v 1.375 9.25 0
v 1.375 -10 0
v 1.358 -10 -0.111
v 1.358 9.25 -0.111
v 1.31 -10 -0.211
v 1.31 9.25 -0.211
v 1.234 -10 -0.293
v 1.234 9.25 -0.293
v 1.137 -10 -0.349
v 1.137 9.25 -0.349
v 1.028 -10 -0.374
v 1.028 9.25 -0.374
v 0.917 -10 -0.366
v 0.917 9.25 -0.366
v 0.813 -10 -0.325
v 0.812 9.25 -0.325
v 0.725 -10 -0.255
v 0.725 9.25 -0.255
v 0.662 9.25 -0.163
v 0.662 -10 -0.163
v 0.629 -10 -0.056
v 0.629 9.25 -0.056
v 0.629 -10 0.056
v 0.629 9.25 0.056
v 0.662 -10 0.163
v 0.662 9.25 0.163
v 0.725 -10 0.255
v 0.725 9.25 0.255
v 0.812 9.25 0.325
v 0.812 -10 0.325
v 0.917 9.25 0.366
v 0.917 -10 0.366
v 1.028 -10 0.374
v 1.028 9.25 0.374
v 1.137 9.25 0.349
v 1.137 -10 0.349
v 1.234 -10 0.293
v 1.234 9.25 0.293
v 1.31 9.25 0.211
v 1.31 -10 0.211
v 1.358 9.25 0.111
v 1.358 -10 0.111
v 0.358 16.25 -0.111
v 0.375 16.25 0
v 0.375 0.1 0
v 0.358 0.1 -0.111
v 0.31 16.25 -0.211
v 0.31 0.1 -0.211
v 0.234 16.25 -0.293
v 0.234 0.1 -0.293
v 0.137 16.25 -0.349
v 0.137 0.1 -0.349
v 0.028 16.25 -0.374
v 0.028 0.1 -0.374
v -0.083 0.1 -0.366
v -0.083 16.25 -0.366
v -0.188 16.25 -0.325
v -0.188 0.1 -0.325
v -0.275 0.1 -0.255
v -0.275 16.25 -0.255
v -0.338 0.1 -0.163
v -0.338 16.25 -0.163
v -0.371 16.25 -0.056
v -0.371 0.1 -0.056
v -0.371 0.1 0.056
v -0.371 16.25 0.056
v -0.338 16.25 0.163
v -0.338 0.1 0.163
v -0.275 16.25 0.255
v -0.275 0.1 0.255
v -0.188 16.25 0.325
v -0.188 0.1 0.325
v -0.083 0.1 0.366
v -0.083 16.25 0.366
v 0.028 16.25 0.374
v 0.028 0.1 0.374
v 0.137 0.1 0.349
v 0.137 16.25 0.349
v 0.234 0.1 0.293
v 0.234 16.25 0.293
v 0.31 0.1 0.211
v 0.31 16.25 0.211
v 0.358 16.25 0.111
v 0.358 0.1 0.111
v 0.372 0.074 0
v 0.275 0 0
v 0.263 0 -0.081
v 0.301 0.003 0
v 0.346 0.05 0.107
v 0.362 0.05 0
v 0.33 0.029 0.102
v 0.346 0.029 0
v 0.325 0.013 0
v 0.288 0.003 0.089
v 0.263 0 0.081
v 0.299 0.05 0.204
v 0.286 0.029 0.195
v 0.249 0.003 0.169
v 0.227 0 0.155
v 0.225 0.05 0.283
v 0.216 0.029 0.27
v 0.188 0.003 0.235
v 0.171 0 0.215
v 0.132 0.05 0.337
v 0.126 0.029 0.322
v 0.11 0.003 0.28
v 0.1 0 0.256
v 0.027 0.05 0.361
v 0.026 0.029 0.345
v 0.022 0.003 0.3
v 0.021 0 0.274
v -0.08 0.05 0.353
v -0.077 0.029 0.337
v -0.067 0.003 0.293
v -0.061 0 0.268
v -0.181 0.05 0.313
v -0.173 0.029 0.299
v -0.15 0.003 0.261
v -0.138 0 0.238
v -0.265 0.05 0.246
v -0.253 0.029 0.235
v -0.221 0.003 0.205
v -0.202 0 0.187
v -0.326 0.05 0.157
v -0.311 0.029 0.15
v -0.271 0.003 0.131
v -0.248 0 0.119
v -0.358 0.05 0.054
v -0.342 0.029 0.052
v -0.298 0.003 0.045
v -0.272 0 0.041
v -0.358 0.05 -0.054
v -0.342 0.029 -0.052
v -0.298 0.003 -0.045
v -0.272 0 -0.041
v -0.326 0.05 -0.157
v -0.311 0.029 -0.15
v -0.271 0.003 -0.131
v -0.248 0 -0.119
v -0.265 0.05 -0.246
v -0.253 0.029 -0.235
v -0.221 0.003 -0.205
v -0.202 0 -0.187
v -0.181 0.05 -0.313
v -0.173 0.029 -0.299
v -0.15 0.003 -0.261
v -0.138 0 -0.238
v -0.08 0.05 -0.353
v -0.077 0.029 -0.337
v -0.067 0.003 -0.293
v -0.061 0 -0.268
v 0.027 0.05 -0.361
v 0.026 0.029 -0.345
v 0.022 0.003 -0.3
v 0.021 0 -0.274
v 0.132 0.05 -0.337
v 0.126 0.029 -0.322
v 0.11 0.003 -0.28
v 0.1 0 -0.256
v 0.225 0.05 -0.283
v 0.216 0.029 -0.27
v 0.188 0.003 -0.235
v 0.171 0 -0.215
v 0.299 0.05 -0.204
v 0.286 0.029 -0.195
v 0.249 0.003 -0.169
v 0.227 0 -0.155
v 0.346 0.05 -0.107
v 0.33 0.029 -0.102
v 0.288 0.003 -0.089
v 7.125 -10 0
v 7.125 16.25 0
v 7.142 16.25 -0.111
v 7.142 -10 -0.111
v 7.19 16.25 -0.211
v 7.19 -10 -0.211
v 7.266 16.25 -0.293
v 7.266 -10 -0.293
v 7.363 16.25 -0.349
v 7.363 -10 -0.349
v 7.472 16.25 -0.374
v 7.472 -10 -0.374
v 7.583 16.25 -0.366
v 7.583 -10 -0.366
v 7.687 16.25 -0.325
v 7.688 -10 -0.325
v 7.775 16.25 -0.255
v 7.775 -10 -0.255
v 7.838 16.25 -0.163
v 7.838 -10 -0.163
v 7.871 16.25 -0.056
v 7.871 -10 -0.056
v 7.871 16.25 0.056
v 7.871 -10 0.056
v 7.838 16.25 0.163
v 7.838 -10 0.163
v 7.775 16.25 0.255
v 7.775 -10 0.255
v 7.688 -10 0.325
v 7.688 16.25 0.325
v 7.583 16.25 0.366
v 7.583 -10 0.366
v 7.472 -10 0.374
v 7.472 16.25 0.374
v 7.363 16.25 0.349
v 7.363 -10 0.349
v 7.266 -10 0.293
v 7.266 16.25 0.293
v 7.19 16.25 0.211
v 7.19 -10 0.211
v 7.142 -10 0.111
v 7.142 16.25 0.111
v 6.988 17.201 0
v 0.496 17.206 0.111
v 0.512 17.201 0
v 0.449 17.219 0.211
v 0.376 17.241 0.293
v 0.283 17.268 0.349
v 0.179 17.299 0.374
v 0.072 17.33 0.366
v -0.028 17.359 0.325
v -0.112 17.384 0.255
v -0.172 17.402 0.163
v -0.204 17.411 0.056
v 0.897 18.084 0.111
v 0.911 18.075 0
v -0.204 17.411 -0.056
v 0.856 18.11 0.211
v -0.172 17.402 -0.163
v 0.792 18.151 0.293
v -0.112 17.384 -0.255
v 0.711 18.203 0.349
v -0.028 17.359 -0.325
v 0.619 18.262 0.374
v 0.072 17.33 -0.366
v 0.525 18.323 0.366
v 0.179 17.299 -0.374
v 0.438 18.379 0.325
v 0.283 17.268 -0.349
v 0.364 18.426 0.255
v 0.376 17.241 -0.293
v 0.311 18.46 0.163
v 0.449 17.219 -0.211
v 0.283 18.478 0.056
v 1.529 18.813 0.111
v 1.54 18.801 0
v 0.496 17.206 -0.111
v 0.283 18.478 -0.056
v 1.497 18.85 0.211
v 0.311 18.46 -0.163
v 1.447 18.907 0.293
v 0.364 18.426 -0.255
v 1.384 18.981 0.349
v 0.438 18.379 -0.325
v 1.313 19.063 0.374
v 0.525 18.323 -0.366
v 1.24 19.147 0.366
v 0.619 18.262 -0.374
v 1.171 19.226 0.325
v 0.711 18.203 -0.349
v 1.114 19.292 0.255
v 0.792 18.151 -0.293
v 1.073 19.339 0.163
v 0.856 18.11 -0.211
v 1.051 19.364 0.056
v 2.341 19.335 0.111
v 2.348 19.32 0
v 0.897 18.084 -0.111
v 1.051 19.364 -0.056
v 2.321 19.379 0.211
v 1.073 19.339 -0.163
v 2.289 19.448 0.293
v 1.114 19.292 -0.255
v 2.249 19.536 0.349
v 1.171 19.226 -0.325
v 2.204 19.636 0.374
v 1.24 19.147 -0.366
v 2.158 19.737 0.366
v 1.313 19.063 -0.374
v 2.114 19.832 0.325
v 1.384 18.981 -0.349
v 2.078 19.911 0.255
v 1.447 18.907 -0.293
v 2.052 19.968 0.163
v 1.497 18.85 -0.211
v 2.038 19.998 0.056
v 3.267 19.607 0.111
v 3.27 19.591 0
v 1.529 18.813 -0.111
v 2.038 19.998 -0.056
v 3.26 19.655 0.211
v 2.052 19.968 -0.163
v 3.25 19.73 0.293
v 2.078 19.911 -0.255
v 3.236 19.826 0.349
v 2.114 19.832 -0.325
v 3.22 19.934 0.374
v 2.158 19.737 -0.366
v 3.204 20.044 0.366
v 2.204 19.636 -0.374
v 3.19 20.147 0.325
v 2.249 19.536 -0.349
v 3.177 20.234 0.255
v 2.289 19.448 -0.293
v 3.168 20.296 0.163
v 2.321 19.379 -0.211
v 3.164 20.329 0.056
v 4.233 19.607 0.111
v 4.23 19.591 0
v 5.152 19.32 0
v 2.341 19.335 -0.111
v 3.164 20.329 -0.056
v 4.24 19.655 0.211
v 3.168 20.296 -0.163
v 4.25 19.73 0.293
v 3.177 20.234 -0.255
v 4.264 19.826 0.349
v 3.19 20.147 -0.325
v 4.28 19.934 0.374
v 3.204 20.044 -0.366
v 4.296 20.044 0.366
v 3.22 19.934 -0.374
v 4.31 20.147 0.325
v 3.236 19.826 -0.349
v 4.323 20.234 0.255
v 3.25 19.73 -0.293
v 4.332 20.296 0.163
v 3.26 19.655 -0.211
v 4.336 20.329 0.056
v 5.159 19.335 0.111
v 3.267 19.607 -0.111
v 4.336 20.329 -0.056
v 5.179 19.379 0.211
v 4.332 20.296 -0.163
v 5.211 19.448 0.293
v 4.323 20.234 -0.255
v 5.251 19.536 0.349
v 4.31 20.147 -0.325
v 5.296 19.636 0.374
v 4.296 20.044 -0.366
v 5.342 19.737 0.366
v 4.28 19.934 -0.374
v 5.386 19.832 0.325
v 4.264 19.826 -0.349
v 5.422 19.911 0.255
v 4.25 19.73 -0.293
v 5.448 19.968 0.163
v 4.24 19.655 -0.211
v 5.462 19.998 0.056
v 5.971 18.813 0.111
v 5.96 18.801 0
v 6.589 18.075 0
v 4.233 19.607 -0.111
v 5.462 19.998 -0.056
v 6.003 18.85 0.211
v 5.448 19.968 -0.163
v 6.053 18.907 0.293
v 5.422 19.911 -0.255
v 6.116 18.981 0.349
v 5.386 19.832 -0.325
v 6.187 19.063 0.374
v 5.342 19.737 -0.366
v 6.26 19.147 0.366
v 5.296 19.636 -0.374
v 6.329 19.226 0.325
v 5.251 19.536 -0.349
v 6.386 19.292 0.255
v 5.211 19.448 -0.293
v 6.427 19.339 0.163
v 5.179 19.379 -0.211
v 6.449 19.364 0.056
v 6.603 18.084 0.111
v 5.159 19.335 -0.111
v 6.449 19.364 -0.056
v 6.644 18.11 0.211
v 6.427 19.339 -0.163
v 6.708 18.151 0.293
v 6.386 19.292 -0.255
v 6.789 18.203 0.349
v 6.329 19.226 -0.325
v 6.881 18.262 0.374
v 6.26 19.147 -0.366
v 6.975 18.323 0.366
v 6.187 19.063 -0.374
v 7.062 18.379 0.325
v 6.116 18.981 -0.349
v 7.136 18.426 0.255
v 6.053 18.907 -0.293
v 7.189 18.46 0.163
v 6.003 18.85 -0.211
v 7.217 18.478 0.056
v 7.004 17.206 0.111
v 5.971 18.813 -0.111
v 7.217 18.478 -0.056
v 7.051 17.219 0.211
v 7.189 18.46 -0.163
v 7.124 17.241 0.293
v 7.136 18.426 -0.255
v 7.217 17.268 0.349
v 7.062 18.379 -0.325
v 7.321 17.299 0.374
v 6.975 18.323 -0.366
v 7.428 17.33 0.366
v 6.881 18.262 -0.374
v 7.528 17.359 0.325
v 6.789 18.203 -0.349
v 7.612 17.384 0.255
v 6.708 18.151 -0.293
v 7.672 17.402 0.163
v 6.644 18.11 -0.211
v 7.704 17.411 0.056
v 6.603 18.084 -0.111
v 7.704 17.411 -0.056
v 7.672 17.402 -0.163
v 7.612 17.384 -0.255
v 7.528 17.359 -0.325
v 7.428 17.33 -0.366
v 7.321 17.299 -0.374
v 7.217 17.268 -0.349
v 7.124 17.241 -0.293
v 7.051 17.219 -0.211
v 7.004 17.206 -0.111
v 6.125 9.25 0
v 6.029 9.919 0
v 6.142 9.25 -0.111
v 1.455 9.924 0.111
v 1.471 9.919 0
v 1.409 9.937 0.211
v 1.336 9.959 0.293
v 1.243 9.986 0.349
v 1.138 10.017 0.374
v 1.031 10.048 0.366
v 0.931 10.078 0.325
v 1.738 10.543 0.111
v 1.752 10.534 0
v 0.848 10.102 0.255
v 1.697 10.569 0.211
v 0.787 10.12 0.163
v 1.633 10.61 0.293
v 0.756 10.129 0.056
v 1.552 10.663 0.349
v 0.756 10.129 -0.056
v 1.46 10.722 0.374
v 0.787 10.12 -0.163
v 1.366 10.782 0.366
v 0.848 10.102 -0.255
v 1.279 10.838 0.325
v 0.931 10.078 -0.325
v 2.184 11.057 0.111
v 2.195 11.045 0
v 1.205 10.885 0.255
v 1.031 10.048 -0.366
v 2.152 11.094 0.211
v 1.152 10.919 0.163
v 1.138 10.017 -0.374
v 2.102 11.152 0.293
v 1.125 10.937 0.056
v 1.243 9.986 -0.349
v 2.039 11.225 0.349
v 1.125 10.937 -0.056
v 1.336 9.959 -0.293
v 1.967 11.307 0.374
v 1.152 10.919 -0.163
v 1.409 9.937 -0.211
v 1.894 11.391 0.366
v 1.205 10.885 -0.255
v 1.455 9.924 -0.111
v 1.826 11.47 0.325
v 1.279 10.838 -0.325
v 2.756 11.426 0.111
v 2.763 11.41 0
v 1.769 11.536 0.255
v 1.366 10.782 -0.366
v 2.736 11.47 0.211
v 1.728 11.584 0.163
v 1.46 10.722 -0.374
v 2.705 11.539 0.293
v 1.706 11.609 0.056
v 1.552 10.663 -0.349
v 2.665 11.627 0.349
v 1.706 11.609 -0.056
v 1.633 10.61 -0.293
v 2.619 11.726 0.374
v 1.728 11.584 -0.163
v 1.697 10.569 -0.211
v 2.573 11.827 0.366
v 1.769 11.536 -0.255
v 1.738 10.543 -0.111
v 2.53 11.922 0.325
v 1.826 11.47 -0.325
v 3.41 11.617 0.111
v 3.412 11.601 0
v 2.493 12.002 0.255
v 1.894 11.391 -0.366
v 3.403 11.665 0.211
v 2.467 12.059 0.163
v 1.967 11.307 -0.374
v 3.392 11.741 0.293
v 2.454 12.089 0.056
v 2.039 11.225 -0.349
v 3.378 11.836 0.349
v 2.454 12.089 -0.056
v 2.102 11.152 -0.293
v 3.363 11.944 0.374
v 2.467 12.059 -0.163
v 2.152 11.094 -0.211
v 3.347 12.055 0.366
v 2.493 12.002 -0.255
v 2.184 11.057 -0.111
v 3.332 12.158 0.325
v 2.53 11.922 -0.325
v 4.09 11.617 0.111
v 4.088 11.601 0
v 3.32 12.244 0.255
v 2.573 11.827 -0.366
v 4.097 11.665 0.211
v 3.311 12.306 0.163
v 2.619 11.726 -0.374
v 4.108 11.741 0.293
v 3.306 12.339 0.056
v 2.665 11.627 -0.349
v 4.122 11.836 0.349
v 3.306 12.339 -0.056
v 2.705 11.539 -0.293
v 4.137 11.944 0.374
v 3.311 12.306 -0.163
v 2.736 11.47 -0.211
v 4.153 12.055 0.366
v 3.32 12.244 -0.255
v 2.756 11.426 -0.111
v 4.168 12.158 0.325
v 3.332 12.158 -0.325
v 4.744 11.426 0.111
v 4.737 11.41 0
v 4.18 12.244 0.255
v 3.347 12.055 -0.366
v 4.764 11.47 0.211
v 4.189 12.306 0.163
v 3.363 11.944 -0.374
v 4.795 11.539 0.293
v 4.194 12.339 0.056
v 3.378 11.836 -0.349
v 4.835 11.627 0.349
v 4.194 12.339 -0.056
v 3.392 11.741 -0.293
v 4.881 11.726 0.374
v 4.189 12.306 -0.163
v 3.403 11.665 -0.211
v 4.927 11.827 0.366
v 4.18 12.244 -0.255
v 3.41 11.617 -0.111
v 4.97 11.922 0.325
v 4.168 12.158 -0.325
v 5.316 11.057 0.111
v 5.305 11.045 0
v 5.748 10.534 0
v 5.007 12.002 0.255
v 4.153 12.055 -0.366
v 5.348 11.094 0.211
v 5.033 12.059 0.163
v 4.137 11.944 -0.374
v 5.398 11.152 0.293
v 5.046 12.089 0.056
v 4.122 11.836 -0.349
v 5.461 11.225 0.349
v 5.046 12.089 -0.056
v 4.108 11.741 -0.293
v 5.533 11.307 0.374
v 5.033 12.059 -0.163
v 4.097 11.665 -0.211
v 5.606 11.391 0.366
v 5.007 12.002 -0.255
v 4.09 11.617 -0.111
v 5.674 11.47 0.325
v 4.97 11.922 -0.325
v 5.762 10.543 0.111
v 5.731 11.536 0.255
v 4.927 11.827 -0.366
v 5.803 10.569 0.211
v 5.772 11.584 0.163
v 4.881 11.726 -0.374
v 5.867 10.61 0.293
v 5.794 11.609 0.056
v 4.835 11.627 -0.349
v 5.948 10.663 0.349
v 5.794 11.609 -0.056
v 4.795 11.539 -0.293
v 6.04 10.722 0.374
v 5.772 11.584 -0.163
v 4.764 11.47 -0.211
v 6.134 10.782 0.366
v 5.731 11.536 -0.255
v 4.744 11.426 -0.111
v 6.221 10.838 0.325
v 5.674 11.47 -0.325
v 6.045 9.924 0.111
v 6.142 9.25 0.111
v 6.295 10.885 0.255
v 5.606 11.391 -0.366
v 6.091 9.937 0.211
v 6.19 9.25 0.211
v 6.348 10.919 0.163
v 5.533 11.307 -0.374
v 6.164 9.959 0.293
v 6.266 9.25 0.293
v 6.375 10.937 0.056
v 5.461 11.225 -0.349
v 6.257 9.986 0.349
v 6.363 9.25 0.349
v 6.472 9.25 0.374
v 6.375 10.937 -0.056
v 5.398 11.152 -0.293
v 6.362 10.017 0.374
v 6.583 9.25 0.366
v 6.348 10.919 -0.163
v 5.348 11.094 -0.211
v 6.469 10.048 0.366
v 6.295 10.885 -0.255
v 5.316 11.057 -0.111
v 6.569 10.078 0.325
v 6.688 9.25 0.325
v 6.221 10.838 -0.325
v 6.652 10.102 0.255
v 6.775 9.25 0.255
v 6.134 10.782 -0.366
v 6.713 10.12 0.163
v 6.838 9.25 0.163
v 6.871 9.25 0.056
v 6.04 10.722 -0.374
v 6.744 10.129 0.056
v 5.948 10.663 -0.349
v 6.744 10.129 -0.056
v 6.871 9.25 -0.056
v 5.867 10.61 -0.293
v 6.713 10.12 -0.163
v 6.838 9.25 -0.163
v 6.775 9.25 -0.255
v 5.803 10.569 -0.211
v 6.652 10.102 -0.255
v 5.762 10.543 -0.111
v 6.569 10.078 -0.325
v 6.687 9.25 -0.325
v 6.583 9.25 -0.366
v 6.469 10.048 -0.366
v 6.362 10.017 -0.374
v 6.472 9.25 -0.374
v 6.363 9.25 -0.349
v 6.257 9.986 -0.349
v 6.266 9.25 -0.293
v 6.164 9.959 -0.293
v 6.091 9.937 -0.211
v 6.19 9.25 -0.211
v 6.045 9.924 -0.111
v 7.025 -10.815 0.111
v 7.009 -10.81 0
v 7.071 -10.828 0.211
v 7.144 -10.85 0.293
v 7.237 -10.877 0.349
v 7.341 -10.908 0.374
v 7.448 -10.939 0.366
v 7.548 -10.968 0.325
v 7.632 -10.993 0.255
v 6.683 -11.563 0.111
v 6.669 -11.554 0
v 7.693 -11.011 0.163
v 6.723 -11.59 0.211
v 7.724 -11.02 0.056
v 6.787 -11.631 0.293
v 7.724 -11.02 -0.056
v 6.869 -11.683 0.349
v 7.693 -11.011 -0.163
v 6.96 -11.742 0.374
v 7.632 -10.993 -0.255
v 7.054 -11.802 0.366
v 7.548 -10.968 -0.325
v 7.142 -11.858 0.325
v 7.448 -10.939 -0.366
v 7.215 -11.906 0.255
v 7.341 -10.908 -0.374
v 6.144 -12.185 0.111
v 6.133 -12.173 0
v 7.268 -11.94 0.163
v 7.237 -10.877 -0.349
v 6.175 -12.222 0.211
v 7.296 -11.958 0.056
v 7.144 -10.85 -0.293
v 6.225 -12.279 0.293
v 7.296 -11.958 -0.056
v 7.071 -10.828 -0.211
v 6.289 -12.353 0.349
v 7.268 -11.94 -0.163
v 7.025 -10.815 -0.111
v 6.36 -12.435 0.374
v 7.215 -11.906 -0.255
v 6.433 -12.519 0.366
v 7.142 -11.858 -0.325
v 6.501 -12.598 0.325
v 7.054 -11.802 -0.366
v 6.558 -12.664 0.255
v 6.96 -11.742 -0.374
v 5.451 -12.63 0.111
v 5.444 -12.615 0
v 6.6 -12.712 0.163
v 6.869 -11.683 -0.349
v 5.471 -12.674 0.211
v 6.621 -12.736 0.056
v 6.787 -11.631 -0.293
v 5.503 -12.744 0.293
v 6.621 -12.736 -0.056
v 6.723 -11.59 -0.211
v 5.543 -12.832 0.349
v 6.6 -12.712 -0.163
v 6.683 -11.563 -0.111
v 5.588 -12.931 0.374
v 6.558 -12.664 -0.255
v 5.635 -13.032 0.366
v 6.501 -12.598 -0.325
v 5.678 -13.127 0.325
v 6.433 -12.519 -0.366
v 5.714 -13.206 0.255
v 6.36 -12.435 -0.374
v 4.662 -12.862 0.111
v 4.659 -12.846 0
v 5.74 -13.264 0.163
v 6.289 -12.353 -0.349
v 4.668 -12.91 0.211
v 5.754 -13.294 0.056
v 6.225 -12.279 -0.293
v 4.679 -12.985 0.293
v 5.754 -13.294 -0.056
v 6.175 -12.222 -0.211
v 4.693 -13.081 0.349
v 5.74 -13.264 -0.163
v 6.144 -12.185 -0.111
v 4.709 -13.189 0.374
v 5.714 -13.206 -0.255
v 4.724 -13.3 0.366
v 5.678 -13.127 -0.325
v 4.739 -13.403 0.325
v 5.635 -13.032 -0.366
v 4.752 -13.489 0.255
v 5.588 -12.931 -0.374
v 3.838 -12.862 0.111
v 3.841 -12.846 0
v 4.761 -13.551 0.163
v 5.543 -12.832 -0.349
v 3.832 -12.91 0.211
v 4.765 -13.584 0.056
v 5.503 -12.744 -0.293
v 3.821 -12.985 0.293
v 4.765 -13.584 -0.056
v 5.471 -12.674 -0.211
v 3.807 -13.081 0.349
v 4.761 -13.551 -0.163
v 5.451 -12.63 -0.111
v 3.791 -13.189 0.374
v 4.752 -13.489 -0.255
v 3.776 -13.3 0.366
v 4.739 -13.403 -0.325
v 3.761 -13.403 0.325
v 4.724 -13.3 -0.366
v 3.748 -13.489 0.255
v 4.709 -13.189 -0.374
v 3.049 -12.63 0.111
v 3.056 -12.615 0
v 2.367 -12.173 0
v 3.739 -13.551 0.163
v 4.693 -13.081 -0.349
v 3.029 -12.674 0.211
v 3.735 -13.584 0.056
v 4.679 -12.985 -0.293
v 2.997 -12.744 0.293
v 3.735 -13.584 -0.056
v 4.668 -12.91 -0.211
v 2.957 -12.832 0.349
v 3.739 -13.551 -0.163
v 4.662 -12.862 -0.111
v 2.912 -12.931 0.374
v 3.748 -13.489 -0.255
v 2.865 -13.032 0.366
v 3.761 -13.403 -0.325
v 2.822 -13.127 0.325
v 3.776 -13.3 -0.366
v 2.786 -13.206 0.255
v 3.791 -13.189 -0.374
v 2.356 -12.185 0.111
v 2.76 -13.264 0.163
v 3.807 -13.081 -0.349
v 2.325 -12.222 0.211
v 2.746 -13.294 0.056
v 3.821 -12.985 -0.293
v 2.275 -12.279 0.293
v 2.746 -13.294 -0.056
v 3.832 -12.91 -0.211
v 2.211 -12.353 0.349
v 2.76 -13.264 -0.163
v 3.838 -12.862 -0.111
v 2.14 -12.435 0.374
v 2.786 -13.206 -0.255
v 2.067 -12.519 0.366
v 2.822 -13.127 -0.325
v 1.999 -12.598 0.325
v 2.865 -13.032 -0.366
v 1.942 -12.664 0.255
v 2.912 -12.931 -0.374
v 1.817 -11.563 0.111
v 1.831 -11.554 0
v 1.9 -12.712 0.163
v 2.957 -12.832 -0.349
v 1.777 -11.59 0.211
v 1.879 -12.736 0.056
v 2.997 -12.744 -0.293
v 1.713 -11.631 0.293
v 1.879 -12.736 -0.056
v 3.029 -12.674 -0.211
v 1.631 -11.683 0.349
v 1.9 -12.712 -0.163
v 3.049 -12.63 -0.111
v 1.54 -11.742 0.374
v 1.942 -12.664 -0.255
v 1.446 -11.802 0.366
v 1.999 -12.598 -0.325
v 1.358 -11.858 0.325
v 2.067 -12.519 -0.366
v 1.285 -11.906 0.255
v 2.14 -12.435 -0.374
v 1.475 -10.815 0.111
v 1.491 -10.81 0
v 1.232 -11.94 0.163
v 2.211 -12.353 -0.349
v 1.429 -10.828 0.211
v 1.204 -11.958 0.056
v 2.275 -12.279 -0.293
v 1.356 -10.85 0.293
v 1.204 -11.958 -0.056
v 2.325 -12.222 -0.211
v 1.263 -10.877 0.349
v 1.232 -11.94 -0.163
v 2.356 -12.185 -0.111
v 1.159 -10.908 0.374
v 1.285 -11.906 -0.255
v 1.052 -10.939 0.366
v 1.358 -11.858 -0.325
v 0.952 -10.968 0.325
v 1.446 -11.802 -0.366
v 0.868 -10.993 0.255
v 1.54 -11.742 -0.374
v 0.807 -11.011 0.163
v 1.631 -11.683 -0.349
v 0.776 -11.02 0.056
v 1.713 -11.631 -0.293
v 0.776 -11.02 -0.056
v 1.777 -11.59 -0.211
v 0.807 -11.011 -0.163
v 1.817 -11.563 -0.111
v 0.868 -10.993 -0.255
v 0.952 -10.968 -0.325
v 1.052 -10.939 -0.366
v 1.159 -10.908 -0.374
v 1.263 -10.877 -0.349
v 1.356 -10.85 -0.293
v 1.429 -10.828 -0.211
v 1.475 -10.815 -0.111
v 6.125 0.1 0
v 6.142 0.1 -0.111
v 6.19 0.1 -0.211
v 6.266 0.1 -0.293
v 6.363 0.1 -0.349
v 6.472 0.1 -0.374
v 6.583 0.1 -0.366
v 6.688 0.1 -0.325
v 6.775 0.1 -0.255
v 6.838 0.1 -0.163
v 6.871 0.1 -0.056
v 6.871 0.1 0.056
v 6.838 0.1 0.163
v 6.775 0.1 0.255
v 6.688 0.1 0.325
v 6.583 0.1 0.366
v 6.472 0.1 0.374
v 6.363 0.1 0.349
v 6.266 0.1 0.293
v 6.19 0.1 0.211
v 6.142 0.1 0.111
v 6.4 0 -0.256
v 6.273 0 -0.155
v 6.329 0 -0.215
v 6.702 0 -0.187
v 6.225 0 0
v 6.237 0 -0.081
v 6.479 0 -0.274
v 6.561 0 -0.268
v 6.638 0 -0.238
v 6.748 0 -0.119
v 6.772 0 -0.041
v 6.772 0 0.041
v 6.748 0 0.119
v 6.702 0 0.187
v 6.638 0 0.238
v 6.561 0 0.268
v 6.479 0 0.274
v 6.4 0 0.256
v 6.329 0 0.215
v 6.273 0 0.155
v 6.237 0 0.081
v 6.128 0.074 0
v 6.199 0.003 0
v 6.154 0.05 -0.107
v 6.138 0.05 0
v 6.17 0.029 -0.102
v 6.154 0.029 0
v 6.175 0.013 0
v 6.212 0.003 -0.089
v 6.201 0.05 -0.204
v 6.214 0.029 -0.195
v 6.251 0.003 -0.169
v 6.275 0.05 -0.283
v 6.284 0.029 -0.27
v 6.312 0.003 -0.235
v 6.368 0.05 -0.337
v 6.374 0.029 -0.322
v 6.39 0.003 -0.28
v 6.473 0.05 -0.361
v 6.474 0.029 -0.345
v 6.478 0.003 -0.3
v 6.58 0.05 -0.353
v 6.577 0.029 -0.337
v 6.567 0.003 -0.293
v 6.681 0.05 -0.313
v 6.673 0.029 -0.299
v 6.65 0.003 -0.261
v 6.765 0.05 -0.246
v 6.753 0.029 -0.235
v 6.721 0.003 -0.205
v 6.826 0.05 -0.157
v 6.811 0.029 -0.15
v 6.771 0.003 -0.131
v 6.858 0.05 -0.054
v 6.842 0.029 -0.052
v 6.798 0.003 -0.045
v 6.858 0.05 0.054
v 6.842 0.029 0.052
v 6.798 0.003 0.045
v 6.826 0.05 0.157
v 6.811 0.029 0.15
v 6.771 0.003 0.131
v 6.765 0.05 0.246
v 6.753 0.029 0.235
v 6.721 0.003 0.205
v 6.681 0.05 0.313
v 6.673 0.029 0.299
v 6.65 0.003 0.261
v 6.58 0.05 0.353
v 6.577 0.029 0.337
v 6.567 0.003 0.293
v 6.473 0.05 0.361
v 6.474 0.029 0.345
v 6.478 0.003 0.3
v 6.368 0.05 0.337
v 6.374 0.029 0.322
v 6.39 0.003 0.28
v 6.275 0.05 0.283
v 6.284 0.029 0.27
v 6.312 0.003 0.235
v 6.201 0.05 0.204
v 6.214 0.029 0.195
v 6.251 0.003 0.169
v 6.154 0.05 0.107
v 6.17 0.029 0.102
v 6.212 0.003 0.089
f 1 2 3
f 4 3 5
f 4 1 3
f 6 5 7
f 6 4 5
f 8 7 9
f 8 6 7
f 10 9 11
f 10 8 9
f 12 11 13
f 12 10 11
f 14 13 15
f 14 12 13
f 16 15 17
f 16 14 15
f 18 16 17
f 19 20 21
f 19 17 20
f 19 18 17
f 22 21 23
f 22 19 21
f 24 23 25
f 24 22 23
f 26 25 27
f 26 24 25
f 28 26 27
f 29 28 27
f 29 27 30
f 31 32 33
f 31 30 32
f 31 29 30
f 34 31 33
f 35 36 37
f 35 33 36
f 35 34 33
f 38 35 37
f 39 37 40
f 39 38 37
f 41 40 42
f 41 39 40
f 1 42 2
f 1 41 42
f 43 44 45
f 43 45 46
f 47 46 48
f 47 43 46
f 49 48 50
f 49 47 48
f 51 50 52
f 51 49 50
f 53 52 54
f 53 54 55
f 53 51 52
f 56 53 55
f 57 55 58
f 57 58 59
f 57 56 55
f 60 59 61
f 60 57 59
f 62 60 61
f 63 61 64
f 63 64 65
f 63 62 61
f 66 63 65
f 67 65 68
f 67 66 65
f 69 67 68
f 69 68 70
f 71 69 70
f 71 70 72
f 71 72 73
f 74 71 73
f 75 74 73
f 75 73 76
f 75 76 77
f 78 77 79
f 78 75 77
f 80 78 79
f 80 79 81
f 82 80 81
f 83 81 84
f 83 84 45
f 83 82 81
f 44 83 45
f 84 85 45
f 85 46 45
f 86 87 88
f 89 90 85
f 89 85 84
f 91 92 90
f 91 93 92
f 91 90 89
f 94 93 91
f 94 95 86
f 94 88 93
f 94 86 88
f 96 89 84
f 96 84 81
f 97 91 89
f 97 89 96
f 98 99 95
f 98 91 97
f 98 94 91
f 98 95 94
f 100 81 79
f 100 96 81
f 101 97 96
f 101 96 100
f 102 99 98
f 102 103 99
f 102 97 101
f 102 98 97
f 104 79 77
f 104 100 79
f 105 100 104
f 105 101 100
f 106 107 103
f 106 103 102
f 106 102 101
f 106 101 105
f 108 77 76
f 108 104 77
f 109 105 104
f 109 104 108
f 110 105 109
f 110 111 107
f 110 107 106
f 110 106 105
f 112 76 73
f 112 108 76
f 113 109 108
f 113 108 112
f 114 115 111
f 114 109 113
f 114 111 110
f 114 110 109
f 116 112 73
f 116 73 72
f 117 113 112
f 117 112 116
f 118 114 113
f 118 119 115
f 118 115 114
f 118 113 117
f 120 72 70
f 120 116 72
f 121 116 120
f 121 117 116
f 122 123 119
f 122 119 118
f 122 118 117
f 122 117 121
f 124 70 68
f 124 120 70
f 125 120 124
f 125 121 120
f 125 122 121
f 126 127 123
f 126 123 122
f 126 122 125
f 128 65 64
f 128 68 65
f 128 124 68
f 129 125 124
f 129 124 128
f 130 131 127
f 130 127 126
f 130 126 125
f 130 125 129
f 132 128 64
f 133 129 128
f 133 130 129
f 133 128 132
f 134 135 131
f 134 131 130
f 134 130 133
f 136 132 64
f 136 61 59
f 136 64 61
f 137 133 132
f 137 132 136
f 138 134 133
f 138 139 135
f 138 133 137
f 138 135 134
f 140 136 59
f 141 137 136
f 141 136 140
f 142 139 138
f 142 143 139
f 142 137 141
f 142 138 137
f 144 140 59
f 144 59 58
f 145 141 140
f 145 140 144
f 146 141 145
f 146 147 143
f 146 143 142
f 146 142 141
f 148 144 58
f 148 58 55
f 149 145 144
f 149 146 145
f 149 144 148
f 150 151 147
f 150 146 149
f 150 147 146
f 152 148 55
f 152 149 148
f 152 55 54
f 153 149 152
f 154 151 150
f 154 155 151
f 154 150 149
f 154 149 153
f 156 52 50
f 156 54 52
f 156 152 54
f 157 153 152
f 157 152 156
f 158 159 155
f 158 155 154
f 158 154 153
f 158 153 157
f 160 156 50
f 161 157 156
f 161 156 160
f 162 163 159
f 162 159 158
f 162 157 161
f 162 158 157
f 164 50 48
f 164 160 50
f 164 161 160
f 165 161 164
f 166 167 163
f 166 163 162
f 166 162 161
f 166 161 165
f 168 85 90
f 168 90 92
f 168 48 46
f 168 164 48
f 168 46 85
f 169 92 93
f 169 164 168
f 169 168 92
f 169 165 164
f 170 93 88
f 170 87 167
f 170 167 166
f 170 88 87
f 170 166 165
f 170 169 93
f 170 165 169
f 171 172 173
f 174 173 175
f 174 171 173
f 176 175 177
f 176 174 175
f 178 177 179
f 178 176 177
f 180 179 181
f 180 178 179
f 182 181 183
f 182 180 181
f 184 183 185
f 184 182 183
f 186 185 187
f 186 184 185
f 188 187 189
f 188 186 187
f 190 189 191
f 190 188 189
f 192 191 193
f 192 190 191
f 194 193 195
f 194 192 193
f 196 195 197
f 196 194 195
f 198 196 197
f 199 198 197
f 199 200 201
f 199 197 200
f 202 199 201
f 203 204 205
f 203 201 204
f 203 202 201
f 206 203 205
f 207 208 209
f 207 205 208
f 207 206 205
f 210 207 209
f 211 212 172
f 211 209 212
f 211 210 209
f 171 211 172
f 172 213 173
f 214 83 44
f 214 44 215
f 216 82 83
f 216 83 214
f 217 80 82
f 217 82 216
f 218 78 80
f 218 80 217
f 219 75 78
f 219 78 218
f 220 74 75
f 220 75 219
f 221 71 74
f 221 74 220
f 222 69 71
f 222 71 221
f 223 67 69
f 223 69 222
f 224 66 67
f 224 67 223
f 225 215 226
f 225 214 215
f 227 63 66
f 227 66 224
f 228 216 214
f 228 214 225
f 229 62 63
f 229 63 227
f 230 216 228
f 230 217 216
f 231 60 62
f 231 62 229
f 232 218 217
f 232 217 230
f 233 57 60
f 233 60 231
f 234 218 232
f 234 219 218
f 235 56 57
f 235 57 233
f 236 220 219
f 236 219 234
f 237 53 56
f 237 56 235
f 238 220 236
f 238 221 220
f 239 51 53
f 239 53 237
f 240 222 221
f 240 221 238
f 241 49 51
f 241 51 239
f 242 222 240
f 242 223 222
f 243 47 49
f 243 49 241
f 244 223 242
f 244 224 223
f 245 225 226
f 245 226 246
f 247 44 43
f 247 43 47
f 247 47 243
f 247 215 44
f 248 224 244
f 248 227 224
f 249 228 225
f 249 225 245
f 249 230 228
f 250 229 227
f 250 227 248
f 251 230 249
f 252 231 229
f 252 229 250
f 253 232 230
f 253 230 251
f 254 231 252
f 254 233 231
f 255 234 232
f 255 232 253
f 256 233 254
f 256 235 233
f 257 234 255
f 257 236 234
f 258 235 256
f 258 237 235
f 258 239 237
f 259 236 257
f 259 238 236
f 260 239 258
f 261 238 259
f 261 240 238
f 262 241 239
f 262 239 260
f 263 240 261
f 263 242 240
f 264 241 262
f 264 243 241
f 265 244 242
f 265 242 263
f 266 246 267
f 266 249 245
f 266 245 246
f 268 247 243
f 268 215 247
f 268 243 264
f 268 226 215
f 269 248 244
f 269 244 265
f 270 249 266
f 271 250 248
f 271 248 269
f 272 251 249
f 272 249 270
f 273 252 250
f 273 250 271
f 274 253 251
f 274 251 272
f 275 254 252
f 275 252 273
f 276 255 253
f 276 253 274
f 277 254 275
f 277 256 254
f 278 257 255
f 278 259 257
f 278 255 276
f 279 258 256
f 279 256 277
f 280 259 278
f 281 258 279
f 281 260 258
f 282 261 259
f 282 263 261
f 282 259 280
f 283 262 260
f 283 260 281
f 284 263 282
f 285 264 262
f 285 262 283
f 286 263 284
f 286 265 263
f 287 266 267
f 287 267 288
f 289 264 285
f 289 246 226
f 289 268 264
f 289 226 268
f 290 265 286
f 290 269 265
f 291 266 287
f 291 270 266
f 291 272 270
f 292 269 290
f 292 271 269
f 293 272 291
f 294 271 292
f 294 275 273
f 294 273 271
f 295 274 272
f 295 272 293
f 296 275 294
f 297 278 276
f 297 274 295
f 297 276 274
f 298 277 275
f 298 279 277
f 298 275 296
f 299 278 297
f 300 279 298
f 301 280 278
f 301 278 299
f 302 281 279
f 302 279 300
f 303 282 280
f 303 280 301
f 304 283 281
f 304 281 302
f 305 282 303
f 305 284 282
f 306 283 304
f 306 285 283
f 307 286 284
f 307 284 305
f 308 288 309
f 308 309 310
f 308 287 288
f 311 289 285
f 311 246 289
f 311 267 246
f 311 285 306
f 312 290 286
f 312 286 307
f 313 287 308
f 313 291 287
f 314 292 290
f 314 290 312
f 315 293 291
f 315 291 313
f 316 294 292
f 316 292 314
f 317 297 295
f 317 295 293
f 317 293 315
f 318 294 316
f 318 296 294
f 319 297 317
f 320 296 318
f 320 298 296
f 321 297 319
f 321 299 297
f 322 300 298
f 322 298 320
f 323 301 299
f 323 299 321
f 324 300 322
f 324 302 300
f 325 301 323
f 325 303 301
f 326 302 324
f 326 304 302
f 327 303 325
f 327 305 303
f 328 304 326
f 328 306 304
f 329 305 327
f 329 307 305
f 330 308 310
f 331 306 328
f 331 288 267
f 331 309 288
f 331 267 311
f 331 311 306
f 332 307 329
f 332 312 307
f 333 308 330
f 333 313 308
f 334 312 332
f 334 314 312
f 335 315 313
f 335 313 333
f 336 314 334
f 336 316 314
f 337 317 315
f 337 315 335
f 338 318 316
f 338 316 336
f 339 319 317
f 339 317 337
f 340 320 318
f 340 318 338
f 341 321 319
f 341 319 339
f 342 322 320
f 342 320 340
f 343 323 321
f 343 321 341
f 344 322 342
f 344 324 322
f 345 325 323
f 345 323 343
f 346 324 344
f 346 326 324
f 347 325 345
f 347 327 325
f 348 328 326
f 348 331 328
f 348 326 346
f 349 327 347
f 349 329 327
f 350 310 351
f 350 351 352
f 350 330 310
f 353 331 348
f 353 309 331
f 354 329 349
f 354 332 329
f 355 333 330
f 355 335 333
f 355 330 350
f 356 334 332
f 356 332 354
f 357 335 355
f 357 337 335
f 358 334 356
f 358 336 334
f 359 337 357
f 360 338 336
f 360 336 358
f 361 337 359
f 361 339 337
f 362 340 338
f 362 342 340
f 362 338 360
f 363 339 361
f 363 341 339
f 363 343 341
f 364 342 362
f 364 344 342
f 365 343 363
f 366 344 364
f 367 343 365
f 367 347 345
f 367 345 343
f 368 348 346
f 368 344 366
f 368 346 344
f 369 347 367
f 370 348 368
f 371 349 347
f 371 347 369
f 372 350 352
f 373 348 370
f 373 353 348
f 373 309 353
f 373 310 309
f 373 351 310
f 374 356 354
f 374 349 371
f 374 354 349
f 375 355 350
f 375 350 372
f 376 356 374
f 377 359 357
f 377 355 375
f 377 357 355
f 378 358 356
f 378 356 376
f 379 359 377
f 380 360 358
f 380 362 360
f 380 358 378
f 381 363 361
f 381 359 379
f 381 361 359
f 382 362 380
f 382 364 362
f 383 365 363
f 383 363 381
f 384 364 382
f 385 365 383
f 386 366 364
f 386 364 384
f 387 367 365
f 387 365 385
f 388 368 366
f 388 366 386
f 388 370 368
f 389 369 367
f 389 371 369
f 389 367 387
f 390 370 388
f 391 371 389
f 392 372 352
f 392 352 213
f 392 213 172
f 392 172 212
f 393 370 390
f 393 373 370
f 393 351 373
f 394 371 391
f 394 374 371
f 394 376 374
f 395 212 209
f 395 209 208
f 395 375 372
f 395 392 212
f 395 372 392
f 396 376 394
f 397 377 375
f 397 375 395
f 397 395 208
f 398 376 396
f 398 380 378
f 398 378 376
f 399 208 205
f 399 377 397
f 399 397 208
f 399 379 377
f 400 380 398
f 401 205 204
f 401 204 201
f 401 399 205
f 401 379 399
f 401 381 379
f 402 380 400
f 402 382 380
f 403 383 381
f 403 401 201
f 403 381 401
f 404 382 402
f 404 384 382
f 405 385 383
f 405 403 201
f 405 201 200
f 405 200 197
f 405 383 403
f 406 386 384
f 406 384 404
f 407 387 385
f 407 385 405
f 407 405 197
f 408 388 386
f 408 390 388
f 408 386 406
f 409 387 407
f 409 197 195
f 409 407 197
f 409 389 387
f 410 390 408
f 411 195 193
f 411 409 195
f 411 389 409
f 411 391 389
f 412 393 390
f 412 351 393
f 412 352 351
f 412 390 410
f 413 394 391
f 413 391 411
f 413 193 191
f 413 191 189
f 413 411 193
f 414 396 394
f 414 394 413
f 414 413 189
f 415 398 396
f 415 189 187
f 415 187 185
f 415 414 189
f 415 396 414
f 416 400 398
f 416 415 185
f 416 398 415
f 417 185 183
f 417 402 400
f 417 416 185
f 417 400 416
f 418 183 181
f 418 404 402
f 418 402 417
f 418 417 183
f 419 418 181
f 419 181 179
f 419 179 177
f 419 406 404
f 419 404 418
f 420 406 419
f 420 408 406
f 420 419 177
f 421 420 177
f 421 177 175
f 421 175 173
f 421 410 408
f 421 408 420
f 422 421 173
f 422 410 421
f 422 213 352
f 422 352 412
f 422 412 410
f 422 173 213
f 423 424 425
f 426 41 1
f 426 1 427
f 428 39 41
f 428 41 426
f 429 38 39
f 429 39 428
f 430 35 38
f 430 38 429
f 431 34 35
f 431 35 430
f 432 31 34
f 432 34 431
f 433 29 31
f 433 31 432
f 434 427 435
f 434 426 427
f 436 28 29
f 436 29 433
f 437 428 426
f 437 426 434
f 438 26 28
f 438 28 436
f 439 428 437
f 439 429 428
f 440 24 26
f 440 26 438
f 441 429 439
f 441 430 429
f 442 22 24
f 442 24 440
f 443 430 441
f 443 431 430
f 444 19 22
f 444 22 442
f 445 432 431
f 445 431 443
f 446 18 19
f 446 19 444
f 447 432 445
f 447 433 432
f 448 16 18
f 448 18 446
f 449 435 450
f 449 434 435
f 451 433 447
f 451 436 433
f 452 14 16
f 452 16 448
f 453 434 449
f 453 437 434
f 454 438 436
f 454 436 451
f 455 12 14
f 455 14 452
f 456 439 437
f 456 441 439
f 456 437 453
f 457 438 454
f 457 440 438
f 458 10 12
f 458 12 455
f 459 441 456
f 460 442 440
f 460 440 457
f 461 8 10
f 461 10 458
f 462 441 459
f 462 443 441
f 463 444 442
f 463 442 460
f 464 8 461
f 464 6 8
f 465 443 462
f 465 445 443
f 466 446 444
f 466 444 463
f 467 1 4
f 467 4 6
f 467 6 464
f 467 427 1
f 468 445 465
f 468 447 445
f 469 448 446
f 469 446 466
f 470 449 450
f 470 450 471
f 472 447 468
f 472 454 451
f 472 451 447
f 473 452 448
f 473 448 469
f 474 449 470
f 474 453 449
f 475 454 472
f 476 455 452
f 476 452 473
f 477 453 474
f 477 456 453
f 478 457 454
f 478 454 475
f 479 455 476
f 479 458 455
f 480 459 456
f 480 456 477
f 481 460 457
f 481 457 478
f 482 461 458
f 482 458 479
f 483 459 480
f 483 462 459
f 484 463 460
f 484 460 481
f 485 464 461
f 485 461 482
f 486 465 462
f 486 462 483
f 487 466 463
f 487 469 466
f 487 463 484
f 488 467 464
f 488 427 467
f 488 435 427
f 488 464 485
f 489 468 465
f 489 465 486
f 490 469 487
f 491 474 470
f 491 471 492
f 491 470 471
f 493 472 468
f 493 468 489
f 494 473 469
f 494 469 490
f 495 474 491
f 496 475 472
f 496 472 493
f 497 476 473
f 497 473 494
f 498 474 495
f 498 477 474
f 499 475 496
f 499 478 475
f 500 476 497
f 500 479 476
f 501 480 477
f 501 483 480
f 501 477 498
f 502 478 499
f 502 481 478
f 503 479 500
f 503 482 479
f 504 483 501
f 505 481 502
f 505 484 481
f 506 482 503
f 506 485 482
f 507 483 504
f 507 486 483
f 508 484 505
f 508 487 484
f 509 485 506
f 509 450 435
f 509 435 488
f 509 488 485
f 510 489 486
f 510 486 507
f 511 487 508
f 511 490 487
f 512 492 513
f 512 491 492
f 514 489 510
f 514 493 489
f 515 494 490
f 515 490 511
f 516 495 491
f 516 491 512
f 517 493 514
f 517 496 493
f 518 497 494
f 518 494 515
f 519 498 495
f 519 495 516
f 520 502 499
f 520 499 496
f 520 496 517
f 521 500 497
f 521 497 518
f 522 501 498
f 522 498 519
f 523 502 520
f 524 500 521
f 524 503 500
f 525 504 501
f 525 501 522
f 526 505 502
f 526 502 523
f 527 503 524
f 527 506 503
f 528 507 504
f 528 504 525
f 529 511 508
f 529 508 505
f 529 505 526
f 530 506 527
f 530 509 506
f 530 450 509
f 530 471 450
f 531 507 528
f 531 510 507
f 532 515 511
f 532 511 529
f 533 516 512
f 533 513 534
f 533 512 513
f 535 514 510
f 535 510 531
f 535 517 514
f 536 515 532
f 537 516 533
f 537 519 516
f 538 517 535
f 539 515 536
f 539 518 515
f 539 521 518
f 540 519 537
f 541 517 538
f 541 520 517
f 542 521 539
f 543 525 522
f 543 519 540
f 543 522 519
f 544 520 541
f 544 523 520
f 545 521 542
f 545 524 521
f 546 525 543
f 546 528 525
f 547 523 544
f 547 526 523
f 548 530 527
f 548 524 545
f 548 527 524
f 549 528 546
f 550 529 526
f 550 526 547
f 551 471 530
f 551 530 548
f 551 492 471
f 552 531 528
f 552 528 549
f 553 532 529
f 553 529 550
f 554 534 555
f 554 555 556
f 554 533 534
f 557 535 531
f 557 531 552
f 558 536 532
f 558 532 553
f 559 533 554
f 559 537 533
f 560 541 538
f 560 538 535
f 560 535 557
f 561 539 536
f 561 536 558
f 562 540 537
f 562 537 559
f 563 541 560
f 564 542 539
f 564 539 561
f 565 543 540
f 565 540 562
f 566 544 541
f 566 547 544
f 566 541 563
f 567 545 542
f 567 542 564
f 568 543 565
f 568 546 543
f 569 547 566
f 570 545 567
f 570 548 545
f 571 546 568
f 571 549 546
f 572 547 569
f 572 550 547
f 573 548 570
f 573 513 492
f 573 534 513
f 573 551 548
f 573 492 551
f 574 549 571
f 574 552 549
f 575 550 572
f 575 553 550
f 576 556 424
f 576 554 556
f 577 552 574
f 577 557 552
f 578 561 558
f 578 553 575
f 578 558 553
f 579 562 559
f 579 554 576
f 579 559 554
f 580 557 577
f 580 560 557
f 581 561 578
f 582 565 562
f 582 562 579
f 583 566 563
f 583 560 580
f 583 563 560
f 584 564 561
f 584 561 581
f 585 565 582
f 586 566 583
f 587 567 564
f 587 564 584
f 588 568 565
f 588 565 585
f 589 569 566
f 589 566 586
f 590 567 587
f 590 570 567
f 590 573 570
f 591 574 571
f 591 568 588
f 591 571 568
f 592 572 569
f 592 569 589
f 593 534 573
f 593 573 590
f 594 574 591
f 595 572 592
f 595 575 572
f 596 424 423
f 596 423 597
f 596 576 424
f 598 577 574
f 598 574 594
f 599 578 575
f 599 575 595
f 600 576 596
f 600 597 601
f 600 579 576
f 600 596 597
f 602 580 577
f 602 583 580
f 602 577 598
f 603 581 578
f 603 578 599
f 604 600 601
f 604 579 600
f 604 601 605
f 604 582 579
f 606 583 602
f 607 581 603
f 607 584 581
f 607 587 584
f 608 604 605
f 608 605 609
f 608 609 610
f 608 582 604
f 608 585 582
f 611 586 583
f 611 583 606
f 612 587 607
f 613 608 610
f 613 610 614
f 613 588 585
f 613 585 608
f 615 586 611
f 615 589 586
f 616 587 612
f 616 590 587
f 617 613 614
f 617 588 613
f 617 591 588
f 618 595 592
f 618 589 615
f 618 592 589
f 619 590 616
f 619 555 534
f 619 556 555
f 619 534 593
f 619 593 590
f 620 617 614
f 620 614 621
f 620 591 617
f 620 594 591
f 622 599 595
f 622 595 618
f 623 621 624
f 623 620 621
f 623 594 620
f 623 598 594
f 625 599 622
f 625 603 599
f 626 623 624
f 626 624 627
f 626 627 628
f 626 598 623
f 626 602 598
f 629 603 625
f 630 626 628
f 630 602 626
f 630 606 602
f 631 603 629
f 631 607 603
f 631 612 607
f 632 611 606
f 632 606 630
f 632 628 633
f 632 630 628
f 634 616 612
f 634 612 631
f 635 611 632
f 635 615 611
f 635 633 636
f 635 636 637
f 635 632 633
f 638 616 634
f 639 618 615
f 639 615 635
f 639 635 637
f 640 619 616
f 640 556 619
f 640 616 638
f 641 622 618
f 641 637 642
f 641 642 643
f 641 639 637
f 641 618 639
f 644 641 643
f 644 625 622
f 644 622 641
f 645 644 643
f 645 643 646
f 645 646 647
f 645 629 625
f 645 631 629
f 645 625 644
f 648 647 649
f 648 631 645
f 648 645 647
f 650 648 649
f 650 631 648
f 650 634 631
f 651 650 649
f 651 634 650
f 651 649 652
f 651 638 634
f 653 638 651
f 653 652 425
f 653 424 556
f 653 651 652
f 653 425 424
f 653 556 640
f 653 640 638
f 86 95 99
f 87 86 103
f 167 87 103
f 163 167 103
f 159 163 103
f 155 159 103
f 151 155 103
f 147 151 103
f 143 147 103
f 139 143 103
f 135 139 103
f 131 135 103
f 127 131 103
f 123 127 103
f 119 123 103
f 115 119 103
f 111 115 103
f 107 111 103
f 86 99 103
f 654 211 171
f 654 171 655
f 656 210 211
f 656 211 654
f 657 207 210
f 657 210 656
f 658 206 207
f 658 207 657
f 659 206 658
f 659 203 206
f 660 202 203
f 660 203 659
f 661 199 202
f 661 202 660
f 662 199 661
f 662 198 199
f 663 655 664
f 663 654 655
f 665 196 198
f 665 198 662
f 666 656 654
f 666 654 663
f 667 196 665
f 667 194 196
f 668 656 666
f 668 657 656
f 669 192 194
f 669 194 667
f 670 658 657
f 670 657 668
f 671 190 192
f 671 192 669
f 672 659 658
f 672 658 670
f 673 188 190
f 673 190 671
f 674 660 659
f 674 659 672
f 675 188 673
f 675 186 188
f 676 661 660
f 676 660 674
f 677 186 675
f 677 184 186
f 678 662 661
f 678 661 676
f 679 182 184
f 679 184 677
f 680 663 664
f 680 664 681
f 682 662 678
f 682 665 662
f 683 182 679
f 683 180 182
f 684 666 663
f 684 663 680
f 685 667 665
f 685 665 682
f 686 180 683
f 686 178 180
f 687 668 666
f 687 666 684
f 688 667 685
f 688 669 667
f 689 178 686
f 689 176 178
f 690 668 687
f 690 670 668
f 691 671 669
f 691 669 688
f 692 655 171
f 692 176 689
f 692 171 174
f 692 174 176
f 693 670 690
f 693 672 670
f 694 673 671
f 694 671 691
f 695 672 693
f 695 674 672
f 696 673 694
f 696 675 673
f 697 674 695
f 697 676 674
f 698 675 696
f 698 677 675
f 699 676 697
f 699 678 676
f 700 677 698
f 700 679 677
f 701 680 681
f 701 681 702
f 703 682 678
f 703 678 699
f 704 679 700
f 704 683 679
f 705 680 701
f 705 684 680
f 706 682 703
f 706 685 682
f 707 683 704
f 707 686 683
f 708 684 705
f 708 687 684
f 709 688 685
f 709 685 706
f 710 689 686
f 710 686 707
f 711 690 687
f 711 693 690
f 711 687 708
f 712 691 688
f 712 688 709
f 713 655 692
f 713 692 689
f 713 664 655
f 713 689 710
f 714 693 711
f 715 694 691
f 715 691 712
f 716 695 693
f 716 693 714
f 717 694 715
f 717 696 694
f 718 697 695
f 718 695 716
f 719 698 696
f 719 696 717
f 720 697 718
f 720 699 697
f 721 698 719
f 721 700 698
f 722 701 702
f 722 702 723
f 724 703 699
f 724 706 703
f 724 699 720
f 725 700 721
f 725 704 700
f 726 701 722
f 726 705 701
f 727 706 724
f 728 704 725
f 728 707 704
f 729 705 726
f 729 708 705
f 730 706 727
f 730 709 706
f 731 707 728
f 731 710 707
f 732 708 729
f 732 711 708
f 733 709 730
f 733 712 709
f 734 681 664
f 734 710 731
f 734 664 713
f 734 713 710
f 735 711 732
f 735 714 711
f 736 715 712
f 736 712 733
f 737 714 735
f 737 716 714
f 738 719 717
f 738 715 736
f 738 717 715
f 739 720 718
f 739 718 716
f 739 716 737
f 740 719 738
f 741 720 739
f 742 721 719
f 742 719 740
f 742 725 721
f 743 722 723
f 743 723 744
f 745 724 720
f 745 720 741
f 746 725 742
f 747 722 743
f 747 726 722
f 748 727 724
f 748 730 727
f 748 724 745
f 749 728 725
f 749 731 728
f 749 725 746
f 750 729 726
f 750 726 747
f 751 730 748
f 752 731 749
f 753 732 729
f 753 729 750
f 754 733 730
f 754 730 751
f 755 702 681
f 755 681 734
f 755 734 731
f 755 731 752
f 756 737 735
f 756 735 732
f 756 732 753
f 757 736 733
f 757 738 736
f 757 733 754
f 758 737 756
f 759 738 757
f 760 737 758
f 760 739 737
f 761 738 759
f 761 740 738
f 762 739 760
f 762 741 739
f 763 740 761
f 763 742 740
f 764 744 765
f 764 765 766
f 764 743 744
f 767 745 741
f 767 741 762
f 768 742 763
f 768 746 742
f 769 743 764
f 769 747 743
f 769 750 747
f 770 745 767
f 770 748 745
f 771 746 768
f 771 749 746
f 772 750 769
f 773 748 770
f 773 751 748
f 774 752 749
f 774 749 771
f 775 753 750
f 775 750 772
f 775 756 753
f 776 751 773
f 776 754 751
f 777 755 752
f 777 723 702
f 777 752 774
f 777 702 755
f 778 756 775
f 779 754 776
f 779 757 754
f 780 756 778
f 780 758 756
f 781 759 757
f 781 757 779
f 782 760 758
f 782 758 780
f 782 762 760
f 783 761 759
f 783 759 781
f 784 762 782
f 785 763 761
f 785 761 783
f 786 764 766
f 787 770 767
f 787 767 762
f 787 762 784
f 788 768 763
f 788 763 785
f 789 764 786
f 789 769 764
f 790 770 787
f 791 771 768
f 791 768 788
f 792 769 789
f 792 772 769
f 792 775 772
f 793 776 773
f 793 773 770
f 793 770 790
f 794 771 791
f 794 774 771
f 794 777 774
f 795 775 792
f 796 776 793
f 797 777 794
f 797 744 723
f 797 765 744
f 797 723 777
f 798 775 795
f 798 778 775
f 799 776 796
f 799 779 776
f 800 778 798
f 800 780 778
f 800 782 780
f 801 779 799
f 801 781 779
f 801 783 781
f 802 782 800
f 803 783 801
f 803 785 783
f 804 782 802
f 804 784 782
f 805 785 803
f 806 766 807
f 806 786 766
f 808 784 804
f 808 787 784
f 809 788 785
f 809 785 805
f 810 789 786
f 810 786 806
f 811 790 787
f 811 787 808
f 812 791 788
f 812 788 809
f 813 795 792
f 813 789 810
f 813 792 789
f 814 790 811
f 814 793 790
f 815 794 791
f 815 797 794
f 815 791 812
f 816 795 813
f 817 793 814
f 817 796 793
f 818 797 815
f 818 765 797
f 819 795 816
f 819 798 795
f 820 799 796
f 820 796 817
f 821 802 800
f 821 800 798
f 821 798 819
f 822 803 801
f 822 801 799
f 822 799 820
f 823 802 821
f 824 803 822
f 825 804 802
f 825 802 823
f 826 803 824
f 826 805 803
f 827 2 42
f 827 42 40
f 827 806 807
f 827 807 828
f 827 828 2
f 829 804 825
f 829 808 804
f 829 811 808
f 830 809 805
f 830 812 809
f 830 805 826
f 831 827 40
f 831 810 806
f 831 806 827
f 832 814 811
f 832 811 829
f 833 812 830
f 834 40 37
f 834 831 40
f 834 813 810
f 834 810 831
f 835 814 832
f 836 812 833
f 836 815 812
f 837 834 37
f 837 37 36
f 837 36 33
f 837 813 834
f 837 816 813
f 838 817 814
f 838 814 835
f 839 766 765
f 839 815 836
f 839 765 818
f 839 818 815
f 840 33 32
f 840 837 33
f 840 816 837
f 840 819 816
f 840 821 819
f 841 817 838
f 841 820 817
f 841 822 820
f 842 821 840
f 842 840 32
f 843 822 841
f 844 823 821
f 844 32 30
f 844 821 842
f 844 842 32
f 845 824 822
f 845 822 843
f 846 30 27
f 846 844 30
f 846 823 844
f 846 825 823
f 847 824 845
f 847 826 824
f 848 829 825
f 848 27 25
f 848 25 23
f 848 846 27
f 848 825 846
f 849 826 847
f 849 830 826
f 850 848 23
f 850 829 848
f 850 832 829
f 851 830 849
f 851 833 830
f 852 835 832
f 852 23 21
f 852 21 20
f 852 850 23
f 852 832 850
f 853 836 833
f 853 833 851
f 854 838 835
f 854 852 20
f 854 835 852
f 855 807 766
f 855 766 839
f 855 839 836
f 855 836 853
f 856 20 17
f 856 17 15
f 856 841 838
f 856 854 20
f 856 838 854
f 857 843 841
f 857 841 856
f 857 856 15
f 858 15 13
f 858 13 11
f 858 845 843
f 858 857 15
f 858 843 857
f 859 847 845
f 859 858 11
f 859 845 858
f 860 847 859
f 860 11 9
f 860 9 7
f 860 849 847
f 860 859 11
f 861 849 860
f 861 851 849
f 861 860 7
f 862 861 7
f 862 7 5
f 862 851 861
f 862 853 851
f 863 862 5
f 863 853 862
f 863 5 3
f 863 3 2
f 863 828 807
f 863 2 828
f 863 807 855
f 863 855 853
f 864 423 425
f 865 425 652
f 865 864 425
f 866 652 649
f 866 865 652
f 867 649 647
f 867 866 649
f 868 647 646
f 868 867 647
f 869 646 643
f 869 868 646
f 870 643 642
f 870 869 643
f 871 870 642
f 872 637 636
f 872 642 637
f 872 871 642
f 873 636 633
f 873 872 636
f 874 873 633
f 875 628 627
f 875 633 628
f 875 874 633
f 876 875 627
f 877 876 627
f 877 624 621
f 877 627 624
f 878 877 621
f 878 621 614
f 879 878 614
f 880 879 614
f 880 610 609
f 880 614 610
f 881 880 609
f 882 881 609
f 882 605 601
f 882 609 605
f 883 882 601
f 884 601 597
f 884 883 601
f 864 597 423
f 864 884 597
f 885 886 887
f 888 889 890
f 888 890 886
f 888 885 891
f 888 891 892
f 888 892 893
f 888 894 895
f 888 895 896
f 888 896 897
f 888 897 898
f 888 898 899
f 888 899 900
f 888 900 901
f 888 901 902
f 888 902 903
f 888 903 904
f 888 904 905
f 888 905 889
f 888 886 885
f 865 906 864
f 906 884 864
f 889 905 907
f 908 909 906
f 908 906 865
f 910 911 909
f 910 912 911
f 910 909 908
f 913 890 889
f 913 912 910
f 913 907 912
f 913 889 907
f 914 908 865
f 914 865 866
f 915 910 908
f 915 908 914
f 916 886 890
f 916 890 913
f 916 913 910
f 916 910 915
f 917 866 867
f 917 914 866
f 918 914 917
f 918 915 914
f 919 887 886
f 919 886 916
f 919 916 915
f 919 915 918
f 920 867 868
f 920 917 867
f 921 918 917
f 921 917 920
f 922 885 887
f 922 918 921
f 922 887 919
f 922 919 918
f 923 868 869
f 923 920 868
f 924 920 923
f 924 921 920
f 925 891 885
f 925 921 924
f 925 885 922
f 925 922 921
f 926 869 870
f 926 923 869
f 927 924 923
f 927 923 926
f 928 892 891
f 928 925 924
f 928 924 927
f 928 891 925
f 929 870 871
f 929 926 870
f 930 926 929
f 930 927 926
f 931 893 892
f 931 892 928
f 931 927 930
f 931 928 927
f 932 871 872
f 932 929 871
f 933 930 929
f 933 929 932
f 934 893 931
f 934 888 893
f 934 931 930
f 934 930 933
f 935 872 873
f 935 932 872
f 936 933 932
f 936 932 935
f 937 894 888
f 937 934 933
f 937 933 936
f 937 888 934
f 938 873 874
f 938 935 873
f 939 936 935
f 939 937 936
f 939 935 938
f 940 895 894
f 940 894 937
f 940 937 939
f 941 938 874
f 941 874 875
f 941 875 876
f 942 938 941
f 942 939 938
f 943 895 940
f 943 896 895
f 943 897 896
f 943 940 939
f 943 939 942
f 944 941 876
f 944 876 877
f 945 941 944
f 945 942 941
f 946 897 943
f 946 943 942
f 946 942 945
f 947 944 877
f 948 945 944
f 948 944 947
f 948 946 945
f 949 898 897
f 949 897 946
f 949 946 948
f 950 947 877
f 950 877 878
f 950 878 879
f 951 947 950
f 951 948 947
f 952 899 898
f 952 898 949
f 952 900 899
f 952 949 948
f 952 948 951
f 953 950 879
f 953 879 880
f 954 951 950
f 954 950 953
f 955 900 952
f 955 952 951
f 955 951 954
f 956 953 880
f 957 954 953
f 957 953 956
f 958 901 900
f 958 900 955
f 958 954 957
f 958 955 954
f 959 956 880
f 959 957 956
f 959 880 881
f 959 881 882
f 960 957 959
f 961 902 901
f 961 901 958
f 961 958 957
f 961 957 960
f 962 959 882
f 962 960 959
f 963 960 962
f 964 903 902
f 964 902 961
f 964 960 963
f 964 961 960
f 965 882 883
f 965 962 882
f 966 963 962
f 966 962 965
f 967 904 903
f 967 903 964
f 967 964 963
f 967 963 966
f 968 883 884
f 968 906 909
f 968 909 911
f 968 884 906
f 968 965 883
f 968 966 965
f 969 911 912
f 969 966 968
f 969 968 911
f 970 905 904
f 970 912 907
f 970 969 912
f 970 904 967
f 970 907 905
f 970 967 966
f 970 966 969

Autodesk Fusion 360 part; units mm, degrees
sketch "Sweep Path" plane through (0, 0, 0) normal (0, 0, 1) x (1, 0, 0)
  line L0 (0, 0) -> (0, 16.25)
  line L1 (0, 16.25) -> (7.5, 16.25) construction
  line L2 (7.5, 16.25) -> (7.5, -10)
  line L3 (7.5, -10) -> (1, -10) construction
  line L4 (1, -10) -> (1, 9.25)
  line L5 (1, 9.25) -> (6.5, 9.25) construction
  line L6 (6.5, 9.25) -> (6.5, 0)
  arc A0 (7.5, 16.25) -> (0, 16.25) centre (3.75, 16.25) ccw
  arc A1 (6.5, 9.25) -> (1, 9.25) centre (3.75, 9.25) ccw
  arc A2 (1, -10) -> (7.5, -10) centre (4.25, -10) ccw
  dimension "d1" = 16.25
  dimension "d2" = 7.5
  dimension "d3" = 26.25
  dimension "d4" = 6.5
  dimension "d5" = 19.25
  dimension "d6" = 5.5
  dimension "d7" = 9.25
sketch "Sketch2" plane through (0, 0, 0) normal (0, 0, 1) x (1, 0, 0)
sketch "Sweep Profile" plane through (0, 0, 0) normal (0, 1, 0) x (1, 0, 0)
  circle A0 centre (0, 0) radius 0.375
  dimension "d8" = 0.75
sweep "Sweep1" add profiles "Sweep Profile" path "Sweep Path" along L0 A0 L2 A2 L4 A1 L6 section 1
fillet "Fillet1" radius 0.1 2 edges at (-0.3496, 0, 0.1356) (6.8496, 0, 0.1356)
